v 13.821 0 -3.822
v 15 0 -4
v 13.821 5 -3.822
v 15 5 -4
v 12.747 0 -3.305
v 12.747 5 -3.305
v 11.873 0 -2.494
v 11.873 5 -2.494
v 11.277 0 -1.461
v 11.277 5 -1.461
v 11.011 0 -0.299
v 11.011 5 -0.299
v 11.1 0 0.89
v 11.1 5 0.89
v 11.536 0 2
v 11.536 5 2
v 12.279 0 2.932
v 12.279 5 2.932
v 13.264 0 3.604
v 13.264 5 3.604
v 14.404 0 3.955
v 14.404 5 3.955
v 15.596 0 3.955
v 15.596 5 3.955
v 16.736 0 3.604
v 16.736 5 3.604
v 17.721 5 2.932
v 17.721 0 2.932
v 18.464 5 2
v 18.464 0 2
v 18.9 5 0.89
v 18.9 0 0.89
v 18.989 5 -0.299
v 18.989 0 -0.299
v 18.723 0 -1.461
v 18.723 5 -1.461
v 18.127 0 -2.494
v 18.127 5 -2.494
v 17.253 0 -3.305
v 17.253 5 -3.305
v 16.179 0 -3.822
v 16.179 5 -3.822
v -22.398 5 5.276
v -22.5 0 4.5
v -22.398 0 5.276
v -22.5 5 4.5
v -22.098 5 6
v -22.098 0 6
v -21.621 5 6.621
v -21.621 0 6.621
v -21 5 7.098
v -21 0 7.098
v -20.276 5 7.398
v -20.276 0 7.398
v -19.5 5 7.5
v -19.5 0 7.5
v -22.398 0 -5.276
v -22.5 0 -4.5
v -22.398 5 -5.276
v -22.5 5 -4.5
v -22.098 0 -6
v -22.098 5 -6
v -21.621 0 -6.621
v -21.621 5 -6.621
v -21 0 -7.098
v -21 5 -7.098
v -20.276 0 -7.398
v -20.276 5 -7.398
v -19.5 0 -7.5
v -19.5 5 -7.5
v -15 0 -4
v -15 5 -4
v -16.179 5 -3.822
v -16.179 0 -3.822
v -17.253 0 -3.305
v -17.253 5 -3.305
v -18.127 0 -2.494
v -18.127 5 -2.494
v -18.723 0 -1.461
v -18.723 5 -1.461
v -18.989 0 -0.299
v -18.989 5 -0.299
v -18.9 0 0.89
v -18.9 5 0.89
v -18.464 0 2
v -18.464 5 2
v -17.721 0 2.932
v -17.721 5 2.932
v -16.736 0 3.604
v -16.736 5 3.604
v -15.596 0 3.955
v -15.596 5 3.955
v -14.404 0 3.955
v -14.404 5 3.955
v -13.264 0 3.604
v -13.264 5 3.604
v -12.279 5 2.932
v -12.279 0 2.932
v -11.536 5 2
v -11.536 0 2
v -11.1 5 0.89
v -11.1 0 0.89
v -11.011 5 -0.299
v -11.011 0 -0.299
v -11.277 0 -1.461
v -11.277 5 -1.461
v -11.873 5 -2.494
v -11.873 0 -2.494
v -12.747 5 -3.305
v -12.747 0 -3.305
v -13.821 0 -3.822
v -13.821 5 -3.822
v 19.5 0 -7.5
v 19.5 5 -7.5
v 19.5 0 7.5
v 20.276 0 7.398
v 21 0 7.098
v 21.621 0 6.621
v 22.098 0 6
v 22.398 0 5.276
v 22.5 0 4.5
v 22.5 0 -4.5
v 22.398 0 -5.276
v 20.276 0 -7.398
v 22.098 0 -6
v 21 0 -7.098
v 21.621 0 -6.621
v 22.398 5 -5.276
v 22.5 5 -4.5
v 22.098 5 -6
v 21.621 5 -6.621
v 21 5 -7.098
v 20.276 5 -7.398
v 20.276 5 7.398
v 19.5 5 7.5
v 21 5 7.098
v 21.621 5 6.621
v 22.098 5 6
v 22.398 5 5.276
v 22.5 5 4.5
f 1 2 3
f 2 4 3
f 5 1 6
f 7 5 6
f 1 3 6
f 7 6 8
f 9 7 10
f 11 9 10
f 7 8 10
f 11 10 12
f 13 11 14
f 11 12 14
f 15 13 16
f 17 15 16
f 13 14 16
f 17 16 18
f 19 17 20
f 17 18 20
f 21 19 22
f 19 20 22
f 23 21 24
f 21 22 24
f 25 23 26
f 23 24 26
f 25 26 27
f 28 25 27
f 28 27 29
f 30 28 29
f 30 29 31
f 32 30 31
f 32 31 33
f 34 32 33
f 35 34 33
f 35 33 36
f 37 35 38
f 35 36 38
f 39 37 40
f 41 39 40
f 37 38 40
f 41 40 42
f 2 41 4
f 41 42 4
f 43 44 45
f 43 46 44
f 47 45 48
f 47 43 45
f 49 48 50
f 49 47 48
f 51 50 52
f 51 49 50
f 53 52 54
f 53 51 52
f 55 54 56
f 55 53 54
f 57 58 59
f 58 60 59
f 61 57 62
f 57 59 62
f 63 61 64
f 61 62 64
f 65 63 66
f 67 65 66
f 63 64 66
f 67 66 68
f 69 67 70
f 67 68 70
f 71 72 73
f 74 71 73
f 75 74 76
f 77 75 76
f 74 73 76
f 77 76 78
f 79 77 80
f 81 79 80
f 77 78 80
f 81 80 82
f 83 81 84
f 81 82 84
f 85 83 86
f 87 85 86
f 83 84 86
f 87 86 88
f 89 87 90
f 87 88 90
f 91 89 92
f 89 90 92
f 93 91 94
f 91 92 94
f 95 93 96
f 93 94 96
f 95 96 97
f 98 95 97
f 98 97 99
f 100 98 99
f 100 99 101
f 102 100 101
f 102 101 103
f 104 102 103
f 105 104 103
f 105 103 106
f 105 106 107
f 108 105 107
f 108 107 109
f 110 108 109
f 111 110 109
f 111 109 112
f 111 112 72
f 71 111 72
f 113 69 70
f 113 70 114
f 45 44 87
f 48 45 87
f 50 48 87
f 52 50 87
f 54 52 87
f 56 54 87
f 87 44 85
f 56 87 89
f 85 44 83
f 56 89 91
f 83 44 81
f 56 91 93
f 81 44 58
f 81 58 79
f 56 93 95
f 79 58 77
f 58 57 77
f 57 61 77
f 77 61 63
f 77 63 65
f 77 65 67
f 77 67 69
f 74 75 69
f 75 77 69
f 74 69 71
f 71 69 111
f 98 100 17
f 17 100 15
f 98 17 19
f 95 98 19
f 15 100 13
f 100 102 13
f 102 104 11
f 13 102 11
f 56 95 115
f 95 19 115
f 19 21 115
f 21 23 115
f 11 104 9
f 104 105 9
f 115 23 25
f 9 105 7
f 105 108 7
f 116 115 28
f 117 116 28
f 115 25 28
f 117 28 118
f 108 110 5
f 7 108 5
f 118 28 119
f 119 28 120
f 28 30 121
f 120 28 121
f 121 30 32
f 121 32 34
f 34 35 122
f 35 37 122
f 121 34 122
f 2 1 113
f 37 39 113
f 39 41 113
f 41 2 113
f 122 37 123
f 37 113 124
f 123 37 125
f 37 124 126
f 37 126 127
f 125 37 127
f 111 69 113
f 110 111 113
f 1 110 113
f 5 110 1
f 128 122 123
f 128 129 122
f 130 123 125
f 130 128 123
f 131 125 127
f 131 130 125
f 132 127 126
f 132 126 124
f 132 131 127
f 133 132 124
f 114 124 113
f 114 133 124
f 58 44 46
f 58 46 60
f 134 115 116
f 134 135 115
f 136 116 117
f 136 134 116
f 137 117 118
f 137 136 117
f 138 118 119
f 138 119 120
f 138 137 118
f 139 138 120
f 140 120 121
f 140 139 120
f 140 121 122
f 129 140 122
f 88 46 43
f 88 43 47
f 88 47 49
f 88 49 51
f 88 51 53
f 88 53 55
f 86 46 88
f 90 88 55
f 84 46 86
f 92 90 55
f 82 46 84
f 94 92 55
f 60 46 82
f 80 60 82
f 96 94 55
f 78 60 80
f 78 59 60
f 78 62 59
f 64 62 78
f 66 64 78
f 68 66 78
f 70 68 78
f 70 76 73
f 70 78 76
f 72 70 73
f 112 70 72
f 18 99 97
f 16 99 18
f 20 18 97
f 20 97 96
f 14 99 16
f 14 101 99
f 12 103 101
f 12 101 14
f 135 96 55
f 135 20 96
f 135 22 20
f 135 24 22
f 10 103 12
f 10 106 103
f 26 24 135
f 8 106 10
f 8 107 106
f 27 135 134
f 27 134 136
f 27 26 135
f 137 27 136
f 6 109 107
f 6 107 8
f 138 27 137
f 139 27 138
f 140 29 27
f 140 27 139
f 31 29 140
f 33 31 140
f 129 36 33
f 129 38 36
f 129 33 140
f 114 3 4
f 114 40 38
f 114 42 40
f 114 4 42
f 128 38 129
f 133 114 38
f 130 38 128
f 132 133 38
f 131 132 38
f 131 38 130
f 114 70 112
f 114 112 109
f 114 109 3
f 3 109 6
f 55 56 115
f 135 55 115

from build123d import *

# Parameters (mm, degrees)
CROQUIS2_W              = 45
CROQUIS2_H              = 15
SALIENTE_EXTRUIR1_DEPTH = 5
REDONDEO1_R             = 3
CROQUIS3_R              = 4
CORTAR_EXTRUIR1_DEPTH   = 10


with BuildPart() as part:
    # Croquis2 → Saliente-Extruir1 (new body)
    with BuildSketch(Plane(origin=(0, 0, 0), x_dir=(1, 0, 0), z_dir=(0, 1, 0))):
        Rectangle(CROQUIS2_W, CROQUIS2_H)
    extrude(amount=SALIENTE_EXTRUIR1_DEPTH)

    # Redondeo1
    redondeo1_edges = [part.edges().sort_by_distance(p)[0] for p in [
        (22.5, 2.5, 7.5),
        (-22.5, 2.5, 7.5),
        (-22.5, 2.5, -7.5),
        (22.5, 2.5, -7.5),
    ]]
    fillet(redondeo1_edges, radius=REDONDEO1_R)

    # Croquis3 → Cortar-Extruir1 (cut, symmetric)
    with BuildSketch(Plane(origin=(0, 5, 0), x_dir=(1, 0, 0), z_dir=(0, 1, 0))):
        with Locations(Location((-15, 0, 0), (0, 0, 90))):
            Circle(CROQUIS3_R)
        with Locations(Location((15, 0, 0), (0, 0, 90))):
            Circle(CROQUIS3_R)
    extrude(amount=CORTAR_EXTRUIR1_DEPTH, both=True, mode=Mode.SUBTRACT)


solid = part.part
